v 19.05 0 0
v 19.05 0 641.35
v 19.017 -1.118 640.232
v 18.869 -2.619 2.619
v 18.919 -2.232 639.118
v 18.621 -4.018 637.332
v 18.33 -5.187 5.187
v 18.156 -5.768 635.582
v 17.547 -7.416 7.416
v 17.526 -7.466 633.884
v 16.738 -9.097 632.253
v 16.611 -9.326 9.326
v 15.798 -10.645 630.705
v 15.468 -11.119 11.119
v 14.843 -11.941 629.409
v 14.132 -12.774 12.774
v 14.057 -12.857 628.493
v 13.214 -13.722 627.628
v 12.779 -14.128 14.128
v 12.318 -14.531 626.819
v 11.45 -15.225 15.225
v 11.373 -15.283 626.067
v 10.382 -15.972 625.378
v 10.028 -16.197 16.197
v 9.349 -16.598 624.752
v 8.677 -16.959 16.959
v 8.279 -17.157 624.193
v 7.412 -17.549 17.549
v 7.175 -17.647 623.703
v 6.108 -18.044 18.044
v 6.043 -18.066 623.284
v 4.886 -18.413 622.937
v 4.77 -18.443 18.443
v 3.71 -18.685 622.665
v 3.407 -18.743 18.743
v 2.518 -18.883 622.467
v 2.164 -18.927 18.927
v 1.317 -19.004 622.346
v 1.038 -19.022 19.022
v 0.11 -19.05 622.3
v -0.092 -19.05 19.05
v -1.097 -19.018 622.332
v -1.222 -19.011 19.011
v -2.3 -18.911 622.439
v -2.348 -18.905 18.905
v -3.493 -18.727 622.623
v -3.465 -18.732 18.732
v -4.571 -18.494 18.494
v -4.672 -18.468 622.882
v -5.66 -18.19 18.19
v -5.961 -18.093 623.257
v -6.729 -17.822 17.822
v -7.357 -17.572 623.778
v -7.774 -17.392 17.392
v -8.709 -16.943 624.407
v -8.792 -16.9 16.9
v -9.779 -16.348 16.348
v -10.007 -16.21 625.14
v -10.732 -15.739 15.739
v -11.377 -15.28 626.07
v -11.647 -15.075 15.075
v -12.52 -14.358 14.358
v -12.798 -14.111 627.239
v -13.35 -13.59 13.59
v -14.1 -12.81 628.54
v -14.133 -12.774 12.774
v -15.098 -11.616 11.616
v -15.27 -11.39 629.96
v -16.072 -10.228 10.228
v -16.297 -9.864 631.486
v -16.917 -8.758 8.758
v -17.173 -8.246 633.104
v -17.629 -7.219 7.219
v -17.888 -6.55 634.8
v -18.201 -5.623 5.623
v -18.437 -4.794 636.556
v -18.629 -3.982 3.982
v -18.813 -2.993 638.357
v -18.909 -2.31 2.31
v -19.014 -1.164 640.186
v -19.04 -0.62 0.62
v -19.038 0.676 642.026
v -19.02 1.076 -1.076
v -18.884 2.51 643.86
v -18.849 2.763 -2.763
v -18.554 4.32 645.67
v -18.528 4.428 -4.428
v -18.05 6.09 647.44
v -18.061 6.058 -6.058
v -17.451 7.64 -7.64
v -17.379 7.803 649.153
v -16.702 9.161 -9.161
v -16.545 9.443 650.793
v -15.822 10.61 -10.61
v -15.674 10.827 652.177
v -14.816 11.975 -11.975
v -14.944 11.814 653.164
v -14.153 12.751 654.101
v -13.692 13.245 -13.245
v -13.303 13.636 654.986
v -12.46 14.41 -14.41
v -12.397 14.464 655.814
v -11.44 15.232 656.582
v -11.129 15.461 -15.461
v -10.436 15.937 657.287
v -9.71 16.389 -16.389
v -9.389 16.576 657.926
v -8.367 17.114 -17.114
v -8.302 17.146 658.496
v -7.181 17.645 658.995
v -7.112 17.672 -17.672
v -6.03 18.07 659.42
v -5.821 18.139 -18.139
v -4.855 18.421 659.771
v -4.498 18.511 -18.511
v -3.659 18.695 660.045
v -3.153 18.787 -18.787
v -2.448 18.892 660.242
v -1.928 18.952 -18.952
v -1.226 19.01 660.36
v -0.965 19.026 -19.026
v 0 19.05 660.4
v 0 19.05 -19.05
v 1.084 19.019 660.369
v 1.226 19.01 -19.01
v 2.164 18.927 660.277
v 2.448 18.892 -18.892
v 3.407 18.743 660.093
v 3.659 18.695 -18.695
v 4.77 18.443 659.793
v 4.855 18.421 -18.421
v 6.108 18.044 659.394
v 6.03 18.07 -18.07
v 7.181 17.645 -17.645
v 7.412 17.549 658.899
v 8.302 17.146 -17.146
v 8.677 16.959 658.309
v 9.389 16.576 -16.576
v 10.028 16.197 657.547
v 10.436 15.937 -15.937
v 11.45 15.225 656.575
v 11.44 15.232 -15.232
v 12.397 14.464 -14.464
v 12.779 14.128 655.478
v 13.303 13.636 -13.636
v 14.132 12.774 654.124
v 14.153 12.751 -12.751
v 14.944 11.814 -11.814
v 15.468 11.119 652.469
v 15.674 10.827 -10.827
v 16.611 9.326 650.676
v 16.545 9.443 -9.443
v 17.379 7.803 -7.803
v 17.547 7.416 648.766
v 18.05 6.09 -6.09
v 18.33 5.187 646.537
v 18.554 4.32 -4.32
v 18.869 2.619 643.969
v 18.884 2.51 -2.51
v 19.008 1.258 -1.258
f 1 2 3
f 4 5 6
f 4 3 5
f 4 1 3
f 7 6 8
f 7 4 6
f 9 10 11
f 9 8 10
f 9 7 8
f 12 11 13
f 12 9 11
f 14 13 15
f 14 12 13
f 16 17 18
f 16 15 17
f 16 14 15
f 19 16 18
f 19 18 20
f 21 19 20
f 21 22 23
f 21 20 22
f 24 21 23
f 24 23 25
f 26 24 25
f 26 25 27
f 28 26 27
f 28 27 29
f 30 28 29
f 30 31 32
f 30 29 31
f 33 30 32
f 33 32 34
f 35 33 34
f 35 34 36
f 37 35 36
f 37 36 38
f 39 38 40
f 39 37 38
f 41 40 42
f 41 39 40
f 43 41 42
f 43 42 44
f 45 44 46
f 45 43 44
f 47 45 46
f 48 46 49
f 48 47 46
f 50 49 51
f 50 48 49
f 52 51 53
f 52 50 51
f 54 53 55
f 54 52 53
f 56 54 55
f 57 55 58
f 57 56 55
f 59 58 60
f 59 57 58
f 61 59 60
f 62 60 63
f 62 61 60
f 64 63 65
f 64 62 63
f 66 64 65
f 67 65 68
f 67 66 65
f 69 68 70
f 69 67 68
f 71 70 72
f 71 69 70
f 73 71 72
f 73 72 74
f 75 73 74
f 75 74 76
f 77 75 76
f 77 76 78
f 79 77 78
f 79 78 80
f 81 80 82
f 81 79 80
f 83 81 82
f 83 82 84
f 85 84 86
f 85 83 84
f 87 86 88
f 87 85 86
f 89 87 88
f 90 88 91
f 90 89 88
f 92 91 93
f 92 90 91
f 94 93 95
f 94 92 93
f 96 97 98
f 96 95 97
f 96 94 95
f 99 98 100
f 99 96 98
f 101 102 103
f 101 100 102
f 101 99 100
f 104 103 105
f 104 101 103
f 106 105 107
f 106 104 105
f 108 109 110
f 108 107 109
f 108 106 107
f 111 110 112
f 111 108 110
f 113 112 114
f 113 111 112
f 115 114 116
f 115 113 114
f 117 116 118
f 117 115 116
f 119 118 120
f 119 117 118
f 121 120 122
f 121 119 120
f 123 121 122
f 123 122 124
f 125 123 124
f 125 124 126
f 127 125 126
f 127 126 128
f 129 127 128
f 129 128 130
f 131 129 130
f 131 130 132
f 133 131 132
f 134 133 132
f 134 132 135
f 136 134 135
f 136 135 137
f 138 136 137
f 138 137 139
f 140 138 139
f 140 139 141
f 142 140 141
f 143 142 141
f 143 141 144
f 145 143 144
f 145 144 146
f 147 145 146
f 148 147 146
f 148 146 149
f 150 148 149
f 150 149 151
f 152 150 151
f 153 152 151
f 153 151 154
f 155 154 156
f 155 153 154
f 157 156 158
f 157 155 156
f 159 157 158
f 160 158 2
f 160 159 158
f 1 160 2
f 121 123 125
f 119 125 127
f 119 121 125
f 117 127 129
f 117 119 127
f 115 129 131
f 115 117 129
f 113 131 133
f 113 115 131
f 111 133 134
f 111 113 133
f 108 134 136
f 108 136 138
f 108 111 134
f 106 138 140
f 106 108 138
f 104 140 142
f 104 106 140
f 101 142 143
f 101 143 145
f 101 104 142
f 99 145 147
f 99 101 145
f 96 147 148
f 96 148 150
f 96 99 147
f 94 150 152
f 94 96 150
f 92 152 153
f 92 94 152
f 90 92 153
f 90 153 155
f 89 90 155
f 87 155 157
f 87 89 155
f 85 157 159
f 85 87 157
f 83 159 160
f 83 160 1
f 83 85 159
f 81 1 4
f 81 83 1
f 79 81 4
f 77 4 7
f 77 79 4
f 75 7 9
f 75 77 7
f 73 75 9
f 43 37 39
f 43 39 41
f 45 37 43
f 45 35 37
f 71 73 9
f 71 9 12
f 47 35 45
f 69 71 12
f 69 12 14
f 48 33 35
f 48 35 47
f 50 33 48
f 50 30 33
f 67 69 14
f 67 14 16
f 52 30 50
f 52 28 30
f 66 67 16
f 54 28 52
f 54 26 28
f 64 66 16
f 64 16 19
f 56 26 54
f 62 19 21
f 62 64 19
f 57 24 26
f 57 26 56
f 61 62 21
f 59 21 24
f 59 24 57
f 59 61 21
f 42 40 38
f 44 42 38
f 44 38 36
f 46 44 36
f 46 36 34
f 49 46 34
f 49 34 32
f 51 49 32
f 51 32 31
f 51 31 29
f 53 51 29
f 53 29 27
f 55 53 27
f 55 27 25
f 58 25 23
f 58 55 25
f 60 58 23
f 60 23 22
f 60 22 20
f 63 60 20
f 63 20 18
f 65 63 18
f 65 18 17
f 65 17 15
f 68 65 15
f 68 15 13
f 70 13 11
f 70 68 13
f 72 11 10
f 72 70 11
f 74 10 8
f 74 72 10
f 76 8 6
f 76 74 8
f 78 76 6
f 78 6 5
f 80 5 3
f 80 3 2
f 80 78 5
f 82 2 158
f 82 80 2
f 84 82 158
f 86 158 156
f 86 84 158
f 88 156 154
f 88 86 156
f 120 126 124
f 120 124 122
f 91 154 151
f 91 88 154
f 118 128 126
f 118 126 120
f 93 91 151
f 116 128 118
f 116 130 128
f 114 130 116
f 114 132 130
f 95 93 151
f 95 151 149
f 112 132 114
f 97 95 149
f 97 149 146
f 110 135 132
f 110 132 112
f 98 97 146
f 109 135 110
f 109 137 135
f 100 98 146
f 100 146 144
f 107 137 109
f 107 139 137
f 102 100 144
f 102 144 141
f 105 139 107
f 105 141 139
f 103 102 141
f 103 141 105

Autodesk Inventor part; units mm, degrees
ref_plane "Start plane" through (0, 0, -19.05) normal (0, 0, 1) x (1, 0, 0)
ref_plane "End plane" through (0, 0, 660.4) normal (0, 0, 1) x (1, 0, 0)
sketch "Sketch" plane through (0, 0, 0) normal (0, 0, 1) x (1, 0, 0)
  circle A0 centre (0, 0) radius 19.05
  dimension "d0" = 38.1
extrude "Body" add sketch "Sketch" along normal up to surface (679.45 mm away) from surface at -19.05
sketch "Sketch2" plane through (0, 0, 0) normal (0, 0, 1) x (1, 0, 0)
  line L0 (0, 0) -> (10, 0)
ref_plane "Work Plane3" through (0, 0, 0) normal (0, -1, 0) x (1, 0, 0)
sketch "Sketch3" plane through (0, 0, 0) normal (0, -1, 0) x (1, 0, 0)
  line L0 (-2, -19.05) -> (12, -19.05)
  line L1 (-2, 660.4) -> (12, 660.4)
  dimension "d7" = 679.45
ref_plane "Work Plane4" through (0, 19.05, 660.4) normal (0, -0.7071, 0.7071) x (1, 0, 0)
split "Split1" plane through (0, 19.05, 660.4) removes the side toward (0, -0.7071, 0.7071)
ref_plane "Work Plane5" through (0, 19.05, -19.05) normal (0, -0.7071, -0.7071) x (1, 0, 0)
split "Split2" plane through (0, 19.05, -19.05) removes the side toward (0, -0.7071, -0.7071)
equation "\"d0\" = Diam"
equation "\"d1\" = G_L"
equation "\"Diam\" = 38.1"
equation "\"G_L\" = d7"
equation "\"G_OFFSET_START\" = 19.05"
equation "\"G_OFFSET_END\" = 19.05"
equation "\"d4\" = -G_OFFSET_START"
equation "\"d5\" = G_OFFSET_END + B_L"
equation "\"B_L\" = 641.35"
properties part number "ANSI/AISC Rolled Steel - 1 1/2-26.75" material "Steel, Mild"
